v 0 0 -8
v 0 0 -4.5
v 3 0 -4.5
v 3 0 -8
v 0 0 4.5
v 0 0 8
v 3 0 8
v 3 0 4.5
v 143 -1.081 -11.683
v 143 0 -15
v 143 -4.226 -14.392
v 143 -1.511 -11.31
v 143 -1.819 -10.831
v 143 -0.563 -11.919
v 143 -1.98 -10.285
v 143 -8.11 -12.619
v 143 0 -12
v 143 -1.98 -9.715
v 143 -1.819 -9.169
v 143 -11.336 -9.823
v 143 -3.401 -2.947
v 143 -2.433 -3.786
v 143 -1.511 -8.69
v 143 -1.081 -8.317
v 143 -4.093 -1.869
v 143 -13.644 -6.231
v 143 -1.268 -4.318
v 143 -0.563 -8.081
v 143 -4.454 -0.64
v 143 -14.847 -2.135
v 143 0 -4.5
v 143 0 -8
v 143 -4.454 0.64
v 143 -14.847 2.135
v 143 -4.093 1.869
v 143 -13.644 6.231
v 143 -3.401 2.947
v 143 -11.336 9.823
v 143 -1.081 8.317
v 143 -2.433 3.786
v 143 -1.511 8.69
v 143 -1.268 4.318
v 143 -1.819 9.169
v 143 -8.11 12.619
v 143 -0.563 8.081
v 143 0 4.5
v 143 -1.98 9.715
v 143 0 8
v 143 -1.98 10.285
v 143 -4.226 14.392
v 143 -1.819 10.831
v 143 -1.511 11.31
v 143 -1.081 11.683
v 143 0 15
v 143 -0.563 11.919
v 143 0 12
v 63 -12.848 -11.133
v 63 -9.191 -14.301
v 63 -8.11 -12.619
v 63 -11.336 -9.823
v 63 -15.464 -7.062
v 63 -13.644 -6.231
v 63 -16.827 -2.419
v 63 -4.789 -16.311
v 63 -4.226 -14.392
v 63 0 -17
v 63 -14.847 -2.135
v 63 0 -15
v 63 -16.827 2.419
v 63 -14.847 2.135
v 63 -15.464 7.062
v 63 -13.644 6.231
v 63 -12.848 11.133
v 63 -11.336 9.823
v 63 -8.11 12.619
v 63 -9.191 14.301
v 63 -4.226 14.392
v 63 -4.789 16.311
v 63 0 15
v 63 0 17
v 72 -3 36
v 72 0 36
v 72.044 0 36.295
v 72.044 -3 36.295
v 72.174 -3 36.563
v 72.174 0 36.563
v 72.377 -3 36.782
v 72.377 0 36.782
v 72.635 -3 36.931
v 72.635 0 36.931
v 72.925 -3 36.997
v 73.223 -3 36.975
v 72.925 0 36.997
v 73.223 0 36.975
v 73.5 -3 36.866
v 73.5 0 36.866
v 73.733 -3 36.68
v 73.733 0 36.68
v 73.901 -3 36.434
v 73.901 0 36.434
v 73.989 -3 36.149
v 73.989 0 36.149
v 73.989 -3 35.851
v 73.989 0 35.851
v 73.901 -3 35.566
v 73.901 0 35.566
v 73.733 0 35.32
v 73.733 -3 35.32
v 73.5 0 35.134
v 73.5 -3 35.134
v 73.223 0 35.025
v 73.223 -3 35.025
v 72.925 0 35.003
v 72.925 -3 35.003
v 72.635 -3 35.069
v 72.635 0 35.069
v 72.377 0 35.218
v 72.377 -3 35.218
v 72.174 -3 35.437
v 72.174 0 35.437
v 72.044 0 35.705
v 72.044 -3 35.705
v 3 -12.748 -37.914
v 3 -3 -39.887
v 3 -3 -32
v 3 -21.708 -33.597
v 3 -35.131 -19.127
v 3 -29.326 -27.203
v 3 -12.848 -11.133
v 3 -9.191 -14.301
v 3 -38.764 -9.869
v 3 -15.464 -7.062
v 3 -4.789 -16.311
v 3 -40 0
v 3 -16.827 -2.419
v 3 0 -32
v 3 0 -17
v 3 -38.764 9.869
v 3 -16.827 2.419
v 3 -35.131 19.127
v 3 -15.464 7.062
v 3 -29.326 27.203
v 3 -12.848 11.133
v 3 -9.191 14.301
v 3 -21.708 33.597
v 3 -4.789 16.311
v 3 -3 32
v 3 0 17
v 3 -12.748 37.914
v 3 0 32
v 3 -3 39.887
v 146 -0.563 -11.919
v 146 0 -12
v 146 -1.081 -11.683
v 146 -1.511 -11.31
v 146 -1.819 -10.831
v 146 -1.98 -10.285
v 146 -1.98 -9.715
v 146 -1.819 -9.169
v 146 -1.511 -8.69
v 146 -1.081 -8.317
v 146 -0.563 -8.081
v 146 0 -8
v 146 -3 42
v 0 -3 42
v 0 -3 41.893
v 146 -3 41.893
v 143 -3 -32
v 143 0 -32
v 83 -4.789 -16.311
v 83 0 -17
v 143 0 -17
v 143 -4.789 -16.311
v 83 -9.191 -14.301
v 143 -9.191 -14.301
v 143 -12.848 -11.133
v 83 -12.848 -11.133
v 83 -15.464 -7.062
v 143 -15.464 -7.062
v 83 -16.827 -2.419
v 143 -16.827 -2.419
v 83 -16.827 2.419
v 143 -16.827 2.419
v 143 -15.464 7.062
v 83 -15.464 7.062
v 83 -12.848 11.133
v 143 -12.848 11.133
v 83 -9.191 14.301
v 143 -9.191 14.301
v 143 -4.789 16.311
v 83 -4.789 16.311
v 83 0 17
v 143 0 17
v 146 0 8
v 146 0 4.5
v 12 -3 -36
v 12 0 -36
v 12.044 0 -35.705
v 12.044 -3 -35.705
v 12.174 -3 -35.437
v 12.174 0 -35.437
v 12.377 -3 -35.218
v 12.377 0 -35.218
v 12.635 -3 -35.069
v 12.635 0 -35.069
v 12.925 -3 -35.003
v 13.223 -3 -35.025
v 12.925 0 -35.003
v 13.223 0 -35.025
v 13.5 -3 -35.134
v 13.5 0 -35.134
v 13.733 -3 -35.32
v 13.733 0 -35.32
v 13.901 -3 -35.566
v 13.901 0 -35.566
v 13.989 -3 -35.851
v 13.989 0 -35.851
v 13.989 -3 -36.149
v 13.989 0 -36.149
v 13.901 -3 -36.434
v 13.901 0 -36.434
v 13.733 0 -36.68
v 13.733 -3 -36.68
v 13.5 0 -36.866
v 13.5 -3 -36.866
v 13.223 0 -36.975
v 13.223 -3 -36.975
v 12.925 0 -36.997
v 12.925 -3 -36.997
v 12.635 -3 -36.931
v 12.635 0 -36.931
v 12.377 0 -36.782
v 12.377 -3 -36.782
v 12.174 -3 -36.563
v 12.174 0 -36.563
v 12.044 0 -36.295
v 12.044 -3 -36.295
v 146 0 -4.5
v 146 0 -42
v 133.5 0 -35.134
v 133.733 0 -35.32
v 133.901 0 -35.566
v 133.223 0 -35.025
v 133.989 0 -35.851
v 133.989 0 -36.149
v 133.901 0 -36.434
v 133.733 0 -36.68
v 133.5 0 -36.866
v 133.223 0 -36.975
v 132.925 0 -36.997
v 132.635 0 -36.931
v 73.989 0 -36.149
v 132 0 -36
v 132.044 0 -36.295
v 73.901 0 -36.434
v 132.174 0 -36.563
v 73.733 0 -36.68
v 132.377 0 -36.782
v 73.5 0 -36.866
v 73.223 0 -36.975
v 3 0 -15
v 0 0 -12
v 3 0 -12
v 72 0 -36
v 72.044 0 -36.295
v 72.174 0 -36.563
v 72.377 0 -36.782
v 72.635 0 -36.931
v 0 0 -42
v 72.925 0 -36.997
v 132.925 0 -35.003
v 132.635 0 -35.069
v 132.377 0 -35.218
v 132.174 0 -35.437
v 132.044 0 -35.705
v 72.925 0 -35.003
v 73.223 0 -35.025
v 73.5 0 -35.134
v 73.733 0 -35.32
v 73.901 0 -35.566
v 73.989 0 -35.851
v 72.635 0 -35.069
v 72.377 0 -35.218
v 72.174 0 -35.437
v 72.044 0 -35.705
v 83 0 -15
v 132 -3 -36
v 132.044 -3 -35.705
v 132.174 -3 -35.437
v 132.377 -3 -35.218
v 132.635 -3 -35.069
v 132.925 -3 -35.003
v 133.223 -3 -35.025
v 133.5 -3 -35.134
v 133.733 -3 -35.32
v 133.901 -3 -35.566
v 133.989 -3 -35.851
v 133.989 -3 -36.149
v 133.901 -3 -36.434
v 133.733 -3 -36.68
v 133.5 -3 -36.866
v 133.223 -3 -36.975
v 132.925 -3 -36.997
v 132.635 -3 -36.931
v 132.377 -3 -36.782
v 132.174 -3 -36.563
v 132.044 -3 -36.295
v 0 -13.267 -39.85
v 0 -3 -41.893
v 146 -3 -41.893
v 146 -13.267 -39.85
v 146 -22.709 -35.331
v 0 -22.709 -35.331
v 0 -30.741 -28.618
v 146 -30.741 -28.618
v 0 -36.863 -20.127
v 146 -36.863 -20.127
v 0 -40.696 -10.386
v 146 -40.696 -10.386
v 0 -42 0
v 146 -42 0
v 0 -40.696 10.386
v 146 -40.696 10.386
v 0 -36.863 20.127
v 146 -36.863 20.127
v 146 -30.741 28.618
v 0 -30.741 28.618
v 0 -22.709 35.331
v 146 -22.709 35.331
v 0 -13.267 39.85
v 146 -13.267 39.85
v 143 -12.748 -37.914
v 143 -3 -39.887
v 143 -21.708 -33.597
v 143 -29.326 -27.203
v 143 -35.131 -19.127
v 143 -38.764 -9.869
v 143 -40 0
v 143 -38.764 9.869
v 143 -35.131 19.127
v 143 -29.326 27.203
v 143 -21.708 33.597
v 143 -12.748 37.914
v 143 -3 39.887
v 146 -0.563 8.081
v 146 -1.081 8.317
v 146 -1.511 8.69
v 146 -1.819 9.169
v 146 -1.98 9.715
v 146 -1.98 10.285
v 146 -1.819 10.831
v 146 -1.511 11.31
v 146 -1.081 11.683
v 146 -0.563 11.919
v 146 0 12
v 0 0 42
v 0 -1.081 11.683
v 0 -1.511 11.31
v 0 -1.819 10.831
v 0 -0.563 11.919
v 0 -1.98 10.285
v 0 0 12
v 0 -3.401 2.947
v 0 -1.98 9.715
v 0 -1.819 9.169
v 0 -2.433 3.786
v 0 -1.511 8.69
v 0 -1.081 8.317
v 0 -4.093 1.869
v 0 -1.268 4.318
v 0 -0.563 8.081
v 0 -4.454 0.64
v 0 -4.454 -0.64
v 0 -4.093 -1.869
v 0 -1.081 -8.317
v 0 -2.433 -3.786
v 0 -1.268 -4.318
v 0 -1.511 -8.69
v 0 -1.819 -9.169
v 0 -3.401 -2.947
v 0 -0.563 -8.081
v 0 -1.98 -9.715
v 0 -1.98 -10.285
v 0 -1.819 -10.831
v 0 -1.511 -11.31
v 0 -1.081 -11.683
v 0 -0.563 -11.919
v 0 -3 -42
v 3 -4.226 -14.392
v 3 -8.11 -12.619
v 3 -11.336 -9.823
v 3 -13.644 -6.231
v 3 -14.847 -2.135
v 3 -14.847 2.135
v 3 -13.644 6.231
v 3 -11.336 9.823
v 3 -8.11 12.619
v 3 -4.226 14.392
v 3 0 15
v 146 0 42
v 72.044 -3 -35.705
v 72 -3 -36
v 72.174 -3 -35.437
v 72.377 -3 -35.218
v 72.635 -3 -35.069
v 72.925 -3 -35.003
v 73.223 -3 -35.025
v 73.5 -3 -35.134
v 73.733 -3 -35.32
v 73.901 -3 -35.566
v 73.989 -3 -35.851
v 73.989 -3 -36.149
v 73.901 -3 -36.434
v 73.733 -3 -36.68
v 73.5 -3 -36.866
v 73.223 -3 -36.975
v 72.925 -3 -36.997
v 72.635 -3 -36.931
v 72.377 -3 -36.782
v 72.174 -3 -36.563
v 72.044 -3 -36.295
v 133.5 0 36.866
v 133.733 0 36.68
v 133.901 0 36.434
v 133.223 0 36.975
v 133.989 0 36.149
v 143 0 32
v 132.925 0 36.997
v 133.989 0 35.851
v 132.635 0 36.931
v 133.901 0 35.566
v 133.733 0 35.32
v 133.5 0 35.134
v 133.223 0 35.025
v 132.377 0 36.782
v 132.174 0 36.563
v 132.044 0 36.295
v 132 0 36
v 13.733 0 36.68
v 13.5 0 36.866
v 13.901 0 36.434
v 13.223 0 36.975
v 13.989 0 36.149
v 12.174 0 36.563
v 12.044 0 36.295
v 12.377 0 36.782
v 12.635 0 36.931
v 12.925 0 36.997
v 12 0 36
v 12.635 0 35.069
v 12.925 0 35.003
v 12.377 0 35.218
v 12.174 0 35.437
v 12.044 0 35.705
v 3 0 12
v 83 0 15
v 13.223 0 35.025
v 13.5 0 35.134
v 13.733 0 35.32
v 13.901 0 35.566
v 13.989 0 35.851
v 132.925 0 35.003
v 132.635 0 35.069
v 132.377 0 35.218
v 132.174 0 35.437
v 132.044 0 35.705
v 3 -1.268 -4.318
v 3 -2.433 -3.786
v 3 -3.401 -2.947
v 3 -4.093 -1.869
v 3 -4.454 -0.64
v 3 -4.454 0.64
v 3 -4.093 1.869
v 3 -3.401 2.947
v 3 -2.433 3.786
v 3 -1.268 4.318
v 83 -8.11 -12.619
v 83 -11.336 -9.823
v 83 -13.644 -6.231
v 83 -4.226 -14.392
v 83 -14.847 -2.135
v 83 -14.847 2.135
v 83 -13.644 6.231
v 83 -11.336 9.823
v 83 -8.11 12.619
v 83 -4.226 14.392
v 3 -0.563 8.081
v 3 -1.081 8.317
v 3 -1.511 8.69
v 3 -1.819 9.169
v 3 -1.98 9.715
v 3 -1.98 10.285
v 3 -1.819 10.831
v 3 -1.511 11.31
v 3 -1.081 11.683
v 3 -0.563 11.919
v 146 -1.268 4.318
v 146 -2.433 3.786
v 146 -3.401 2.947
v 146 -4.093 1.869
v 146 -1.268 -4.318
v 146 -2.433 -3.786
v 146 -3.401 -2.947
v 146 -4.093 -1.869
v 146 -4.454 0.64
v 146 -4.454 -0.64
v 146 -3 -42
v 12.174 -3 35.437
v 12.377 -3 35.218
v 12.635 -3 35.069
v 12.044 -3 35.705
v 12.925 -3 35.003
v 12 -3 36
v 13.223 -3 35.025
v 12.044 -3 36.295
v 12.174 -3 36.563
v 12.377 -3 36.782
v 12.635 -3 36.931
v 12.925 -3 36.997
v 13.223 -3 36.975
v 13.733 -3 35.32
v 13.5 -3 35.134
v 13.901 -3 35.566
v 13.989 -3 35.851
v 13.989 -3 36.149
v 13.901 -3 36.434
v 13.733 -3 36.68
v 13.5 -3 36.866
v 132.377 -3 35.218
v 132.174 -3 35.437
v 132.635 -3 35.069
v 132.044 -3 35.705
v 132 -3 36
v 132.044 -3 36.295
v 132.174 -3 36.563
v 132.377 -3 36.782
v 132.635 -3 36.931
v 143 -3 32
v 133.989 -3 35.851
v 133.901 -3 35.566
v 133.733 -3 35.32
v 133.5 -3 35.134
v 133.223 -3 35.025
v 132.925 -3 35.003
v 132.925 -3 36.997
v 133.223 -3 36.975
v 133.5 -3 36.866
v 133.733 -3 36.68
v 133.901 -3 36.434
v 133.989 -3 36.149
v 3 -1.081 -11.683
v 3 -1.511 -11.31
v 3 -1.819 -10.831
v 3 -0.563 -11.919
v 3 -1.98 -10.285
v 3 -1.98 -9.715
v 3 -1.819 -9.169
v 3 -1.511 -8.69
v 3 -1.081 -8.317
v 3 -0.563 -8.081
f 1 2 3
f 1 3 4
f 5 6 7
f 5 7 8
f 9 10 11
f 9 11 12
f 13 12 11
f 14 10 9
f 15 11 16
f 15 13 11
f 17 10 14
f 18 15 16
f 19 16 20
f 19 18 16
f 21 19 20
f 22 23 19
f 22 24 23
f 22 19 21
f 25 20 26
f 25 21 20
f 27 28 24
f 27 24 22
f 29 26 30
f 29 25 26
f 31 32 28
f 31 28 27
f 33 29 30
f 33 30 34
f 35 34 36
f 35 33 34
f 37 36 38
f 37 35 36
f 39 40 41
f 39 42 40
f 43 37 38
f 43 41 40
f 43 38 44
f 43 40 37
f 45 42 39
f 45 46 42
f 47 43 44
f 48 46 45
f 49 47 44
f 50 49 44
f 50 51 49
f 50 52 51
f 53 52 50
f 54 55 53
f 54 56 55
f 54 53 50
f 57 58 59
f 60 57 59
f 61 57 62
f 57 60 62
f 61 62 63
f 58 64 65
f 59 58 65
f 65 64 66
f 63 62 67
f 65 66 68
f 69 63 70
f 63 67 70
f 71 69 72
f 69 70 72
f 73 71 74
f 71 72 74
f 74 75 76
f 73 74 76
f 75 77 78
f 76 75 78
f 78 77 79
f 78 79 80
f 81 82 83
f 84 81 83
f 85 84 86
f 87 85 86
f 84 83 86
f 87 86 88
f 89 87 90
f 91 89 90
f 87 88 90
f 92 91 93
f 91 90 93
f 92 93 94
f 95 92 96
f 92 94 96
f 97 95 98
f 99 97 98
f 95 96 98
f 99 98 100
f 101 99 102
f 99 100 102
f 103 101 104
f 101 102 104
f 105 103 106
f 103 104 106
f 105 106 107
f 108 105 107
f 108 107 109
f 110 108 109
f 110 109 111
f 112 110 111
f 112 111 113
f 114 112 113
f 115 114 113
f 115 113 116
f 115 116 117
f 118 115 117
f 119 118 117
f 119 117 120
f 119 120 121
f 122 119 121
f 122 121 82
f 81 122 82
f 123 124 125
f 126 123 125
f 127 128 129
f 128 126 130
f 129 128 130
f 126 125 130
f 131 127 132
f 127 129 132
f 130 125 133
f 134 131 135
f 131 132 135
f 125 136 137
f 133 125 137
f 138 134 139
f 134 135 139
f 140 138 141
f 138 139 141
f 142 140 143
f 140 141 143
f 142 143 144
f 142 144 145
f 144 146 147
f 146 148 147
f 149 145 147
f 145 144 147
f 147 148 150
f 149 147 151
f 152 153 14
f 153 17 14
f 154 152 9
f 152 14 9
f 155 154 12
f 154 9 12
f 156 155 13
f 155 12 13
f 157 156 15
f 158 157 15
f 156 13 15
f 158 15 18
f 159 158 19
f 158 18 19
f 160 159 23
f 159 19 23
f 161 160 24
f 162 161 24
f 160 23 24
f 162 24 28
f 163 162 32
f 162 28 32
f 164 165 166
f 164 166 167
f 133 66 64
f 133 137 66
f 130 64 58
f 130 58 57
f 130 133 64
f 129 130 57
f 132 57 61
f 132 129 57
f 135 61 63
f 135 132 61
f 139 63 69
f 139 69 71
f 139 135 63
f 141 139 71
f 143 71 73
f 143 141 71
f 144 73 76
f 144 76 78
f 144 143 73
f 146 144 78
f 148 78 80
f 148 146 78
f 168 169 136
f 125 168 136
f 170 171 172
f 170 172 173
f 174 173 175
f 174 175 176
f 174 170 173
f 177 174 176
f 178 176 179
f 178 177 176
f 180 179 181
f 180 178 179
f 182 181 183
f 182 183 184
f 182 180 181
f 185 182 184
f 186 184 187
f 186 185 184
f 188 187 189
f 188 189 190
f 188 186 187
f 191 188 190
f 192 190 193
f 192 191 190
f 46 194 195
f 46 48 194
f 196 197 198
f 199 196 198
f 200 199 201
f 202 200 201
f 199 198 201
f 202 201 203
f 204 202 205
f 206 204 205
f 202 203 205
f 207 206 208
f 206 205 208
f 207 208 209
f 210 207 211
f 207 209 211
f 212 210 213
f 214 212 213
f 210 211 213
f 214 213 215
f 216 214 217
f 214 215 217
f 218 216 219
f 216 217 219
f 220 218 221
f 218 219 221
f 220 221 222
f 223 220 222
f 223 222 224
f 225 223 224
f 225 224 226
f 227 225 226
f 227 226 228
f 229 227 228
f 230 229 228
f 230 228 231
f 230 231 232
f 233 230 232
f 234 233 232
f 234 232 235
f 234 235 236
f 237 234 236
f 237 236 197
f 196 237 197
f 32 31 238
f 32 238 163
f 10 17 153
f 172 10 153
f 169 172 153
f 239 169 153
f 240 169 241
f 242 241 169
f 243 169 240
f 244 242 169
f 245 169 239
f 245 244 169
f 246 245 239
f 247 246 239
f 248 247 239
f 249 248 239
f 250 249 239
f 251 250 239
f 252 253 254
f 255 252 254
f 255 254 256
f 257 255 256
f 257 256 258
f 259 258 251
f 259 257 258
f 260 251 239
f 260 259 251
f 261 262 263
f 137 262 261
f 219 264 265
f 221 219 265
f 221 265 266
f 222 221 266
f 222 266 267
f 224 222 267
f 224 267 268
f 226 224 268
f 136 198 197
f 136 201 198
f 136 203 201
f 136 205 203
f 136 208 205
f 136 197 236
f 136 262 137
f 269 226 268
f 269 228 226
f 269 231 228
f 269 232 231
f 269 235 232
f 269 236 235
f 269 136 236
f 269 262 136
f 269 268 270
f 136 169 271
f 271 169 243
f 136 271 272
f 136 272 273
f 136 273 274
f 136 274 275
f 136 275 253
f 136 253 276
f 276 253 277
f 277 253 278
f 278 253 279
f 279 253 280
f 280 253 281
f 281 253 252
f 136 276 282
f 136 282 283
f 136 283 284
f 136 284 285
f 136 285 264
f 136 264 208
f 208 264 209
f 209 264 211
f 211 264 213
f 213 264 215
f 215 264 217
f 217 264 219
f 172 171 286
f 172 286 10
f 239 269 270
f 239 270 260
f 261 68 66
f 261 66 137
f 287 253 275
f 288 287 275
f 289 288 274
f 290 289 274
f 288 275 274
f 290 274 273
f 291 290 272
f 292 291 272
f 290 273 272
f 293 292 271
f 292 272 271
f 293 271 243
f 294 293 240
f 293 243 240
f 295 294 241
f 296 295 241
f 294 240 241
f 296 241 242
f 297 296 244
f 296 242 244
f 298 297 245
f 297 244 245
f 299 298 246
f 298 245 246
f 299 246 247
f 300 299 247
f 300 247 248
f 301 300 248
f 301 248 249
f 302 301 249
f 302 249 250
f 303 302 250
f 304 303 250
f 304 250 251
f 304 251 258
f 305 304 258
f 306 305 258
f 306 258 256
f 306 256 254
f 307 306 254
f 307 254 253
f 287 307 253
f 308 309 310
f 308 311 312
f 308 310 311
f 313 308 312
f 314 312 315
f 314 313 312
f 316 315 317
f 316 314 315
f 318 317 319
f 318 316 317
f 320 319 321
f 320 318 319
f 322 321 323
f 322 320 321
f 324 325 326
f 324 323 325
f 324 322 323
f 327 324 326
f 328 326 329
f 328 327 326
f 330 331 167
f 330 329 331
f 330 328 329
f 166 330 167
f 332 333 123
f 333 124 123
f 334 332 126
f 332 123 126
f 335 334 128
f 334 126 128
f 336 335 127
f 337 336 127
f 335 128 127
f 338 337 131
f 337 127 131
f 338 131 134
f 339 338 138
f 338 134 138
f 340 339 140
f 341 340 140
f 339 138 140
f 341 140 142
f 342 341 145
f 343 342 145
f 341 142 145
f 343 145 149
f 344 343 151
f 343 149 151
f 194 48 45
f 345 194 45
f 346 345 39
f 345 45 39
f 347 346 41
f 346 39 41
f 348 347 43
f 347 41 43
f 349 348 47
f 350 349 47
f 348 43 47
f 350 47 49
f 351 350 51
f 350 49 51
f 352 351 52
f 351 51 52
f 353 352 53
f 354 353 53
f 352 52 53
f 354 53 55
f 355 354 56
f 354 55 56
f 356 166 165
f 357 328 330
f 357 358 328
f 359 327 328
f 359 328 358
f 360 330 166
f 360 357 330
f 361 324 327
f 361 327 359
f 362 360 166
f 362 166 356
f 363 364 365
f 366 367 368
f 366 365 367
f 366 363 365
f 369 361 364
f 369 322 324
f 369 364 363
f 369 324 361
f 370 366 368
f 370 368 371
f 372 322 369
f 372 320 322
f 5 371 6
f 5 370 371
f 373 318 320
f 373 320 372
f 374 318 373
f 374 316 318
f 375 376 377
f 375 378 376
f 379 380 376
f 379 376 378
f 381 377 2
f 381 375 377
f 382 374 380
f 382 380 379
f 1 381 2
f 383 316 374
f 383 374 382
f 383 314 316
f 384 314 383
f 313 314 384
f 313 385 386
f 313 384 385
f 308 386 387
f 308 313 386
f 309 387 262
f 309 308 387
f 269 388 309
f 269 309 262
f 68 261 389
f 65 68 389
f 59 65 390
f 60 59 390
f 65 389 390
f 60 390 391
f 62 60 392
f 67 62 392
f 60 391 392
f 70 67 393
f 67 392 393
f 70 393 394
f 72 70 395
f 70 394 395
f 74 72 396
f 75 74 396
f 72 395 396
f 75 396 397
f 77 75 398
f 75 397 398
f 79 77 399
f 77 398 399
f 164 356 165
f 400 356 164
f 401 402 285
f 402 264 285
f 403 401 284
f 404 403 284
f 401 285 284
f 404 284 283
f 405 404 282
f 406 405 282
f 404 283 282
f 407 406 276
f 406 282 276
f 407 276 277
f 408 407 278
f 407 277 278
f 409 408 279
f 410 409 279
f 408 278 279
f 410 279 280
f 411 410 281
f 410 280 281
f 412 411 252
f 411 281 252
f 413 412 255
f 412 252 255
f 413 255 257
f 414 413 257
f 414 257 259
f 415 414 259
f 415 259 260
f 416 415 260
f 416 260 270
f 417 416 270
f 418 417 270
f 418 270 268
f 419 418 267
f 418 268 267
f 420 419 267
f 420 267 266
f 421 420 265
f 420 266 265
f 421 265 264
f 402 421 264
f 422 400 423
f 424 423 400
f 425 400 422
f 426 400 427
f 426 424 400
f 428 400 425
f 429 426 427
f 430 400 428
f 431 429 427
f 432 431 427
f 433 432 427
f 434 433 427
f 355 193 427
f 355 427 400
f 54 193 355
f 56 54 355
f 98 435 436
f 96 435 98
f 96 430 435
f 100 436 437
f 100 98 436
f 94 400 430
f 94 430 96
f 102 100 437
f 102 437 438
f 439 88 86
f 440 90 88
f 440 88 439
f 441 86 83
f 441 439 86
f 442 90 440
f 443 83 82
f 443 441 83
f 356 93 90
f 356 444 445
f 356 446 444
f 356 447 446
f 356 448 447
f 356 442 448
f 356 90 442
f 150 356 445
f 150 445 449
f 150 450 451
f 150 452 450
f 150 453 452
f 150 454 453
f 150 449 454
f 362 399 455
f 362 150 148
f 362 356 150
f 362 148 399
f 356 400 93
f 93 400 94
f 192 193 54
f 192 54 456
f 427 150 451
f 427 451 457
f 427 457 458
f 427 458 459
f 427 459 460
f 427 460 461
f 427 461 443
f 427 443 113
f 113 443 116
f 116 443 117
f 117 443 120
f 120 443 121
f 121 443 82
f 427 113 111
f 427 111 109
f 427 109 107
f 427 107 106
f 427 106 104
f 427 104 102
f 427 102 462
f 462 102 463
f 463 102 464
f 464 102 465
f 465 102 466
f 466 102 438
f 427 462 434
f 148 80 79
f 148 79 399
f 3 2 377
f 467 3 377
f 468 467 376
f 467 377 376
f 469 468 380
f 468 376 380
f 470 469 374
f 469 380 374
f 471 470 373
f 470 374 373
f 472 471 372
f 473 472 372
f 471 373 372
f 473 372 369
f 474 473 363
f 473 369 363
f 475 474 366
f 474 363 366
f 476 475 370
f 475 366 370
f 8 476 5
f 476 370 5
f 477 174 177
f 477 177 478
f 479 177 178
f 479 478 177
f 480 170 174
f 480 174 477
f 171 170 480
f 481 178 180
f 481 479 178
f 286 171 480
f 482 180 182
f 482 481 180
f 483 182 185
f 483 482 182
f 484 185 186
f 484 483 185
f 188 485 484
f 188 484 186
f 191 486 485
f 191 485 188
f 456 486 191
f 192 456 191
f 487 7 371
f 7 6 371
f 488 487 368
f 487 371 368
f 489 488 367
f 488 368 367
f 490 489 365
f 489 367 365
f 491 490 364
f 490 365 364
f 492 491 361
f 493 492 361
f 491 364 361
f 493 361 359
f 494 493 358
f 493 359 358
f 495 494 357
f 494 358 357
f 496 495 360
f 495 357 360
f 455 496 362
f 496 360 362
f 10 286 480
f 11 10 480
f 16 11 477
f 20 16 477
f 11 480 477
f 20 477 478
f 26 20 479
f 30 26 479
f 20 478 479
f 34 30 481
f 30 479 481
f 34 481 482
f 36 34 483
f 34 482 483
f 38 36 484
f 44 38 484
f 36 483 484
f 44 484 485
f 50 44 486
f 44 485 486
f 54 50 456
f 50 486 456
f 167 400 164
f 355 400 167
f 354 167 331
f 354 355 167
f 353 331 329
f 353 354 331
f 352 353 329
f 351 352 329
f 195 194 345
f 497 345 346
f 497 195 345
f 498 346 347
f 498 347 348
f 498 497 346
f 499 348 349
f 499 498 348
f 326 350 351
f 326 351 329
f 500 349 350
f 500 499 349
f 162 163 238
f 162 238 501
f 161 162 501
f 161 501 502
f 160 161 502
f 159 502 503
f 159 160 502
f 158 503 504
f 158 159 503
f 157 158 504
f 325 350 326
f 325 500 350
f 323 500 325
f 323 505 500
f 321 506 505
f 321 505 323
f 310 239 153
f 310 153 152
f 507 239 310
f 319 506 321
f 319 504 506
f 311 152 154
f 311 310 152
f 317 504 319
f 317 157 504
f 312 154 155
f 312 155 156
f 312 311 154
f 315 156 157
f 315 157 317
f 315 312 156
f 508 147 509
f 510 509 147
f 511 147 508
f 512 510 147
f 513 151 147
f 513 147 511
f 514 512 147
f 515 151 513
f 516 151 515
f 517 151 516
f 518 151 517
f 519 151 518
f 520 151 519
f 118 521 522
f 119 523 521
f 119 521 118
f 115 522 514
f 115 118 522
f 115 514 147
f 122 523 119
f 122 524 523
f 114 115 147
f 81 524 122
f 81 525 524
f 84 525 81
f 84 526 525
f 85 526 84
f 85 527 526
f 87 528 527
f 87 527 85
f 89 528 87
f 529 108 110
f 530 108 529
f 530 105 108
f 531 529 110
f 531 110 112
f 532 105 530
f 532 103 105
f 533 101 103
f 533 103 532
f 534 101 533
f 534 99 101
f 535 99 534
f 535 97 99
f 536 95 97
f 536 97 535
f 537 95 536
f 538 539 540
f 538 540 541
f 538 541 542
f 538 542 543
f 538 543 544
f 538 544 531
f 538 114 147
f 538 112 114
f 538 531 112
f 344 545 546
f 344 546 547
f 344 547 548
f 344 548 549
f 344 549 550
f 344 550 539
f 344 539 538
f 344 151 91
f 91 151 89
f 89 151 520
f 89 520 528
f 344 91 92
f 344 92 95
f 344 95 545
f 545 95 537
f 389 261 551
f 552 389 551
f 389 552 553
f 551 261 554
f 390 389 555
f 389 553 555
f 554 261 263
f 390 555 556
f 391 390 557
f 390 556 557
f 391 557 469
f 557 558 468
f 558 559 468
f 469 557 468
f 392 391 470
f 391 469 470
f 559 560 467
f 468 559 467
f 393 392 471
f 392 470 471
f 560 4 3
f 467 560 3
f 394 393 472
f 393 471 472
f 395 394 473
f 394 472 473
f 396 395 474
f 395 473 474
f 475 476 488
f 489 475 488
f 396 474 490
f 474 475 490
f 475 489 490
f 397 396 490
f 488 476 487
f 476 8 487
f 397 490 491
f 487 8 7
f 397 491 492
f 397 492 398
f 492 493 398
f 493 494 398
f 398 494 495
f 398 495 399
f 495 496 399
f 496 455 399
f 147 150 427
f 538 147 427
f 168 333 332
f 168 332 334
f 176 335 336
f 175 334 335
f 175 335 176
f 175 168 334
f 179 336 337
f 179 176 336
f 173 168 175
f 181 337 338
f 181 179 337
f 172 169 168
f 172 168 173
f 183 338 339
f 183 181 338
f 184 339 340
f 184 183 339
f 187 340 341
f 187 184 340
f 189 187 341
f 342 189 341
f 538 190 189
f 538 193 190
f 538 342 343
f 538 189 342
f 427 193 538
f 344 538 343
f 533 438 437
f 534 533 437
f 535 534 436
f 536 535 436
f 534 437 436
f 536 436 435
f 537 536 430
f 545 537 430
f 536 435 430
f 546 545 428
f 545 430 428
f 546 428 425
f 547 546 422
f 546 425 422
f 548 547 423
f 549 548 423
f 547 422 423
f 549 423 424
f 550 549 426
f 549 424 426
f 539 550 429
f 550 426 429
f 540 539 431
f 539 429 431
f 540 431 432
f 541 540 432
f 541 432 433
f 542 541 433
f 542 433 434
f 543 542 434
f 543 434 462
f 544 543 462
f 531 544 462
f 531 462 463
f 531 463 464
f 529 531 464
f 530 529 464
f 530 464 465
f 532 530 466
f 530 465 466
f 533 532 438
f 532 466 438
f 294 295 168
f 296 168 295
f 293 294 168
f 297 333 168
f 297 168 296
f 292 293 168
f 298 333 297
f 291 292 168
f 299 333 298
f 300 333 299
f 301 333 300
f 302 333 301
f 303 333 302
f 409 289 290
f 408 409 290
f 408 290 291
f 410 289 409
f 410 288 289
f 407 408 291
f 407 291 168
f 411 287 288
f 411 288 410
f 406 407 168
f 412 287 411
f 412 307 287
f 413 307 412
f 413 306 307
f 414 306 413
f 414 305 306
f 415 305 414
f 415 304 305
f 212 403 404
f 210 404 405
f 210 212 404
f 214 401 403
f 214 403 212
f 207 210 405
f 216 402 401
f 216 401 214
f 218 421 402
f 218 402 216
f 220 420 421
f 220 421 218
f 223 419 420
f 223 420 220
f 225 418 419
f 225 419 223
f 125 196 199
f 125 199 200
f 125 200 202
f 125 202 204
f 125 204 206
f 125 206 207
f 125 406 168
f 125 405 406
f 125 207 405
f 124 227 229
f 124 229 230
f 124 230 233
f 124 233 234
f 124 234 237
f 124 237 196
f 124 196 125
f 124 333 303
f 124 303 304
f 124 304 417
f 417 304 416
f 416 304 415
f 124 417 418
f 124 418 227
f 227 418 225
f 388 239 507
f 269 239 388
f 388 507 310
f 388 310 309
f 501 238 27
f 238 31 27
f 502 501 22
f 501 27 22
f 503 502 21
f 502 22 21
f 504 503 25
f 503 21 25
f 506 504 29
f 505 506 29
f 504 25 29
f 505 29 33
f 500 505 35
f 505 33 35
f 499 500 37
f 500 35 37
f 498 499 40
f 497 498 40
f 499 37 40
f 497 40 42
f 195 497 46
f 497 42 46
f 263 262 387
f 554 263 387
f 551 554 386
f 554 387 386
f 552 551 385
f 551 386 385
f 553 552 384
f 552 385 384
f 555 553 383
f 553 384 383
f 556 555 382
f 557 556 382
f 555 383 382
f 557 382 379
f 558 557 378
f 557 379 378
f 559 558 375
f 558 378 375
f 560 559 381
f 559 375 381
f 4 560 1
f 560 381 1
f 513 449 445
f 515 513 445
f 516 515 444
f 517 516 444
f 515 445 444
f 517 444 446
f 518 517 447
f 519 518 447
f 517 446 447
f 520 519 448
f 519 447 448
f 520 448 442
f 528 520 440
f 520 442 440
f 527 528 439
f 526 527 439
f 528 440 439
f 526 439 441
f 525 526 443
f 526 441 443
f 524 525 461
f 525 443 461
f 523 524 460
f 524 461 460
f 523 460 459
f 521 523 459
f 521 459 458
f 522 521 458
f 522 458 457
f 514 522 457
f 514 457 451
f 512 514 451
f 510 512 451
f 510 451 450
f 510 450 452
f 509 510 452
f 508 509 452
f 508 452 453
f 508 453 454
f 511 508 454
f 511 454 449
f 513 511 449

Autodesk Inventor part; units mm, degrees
ref_plane "YZ Plane" through (0, 0, 0) normal (1, 0, 0) x (0, 1, 0)
ref_plane "XZ Plane" through (0, 0, 0) normal (0, 1, 0) x (-1, 0, 0)
ref_plane "XY Plane" through (0, 0, 0) normal (0, 0, 1) x (1, 0, 0)
sketch "Szkic1" plane through (0, 0, 0) normal (1, 0, 0) x (0, 1, 0)
  circle A0 centre (0, 0) radius 42
  dimension "d0" = 84
extrude "Wyciągnięcie proste1" add sketch "Szkic1" along normal blind 146
ref_plane "Płaszczyzna konstrukcyjna1" through (3, 0, 0) normal (-1, 0, 0) x (0, 0, 1)
sketch "Szkic2" plane through (3, 0, 0) normal (-1, 0, 0) x (0, 0, 1)
  point P0 (0, 0)
sketch "Szkic3" plane through (3, 0, 0) normal (-1, 0, 0) x (0, 0, 1)
  circle A0 centre (0, 0) radius 17
  circle A1 centre (0, 0) radius 15
  arc A2 (-17.4356, 36) -> (17.4356, 36) centre (0, 0) ccw
  line L0 (17.4356, 36) -> (-17.4356, 36)
  dimension "d4" = 34
  dimension "d5" = 30
  dimension "d10" = 80
sketch "Szkic4" plane through (0, 0, 0) normal (-1, 0, 0) x (0, 0, 1)
  circle A0 centre (0, 0) radius 42 projected
  circle A1 centre (0, 0) radius 4.5
  circle A2 centre (10, 0) radius 2
  circle A3 centre (-10, 0) radius 2
  dimension "d6" = 9
extrude "Wyciągnięcie proste2" cut sketch "Szkic4" against normal blind 146 contours A1 | A2 | A3
extrude "Wyciągnięcie proste3" cut sketch "Szkic3" against normal blind 140
ref_plane "Płaszczyzna konstrukcyjna2" through (63, 0, 0) normal (-1, 0, 0) x (0, 0, 1)
sketch "Szkic6" plane through (63, 0, 0) normal (-1, 0, 0) x (0, 0, 1)
  circle A0 centre (0, 0) radius 17
extrude "Wyciągnięcie proste4" cut sketch "Szkic6" against normal blind 20
sketch "Szkic7" plane through (0, 0, 0) normal (-1, 0, 0) x (0, 0, 1)
  circle A0 centre (-10, 0) radius 2 projected
  circle A1 centre (10, 0) radius 2 projected
  circle A2 centre (0, 0) radius 4.5 projected
  circle A3 centre (0, 0) radius 42 projected
  point P0 (42, 0)
ref_plane "Płaszczyzna konstrukcyjna3" through (0, 0, 42) normal (0, 0, 1) x (1, 0, 0)
sketch "Szkic8" plane through (0, 0, 42) normal (0, 0, 1) x (1, 0, 0)
  line L0 (0, -4.5) -> (0, 4.5) projected
  line L1 (146, 3) -> (0, 3)
  line L2 (0, 3) -> (0, -3)
  line L3 (0, -3) -> (146, -3)
  line L4 (146, -3) -> (146, 3)
  line L5 (146, 3) -> (0, -3) construction
  line L6 (0, 3) -> (146, -3) construction
  point P0 (0, 0)
  point P1 (73, 0)
  dimension "d16" = 6
extrude "Wyciągnięcie proste5" add sketch "Szkic8" against normal blind 10
sketch "Szkic9" plane through (0, 0, 0) normal (-1, 0, 0) x (0, 0, 1)
  line L0 (42, 3) -> (42, -3) projected
  line L1 (42, 3) -> (41.8927, 3) projected
  arc A0 (41.8927, 3) -> (41.8927, -3) centre (0, 0) ccw projected
  line L2 (42, -3) -> (41.8927, -3) projected
  circle A1 centre (0, 0) radius 4.5 projected
  circle A2 centre (10, 0) radius 2 projected
  circle A3 centre (-10, 0) radius 2 projected
  point P0 (-42, 0)
ref_plane "Płaszczyzna konstrukcyjna4" through (0, 0, -42) normal (0, 0, -1) x (-1, 0, 0)
sketch "Szkic10" plane through (0, 0, -42) normal (0, 0, -1) x (-1, 0, 0)
  line L0 (-146, -3) -> (0, -3)
  line L1 (0, -3) -> (0, 3)
  line L2 (0, 3) -> (-146, 3)
  line L3 (-146, 3) -> (-146, -3)
  line L4 (-146, -3) -> (0, 3) construction
  line L5 (0, -3) -> (-146, 3) construction
  point P0 (0, 0)
  point P1 (-73, 0)
extrude "Wyciągnięcie proste6" add sketch "Szkic10" against normal blind 10
sketch "Szkic11" plane through (0, 0, 0) normal (-1, 0, 0) x (0, 0, 1)
  circle A0 centre (-10, 0) radius 2 projected
  circle A1 centre (10, 0) radius 2 projected
  circle A2 centre (0, 0) radius 4.5 projected
  line L0 (-42, -3) -> (-42, 3) projected
  line L1 (-42, -3) -> (-41.8927, -3) projected
  arc A3 (-41.8927, -3) -> (41.8927, -3) centre (0, 0) ccw projected
  line L2 (42, -3) -> (41.8927, -3) projected
  line L3 (42, 3) -> (42, -3) projected
  line L4 (42, 3) -> (41.8927, 3) projected
  arc A4 (41.8927, 3) -> (-41.8927, 3) centre (0, 0) ccw projected
  line L5 (-42, 3) -> (-41.8927, 3) projected
  arc A5 (41.8927, 3) -> (-41.8927, 3) centre (0, 0) ccw projected
  point P0 (0, 42)
ref_plane "Płaszczyzna konstrukcyjna5" through (0, 42, 0) normal (0, 1, 0) x (-1, 0, 0)
sketch "Szkic12" plane through (0, 42, 0) normal (0, 1, 0) x (-1, 0, 0)
  circle A0 centre (-73, -36) radius 1
  circle A1 centre (-133, -36) radius 1
  circle A2 centre (-13, -36) radius 1
  circle A3 centre (-13, 36) radius 1
  circle A4 centre (-73, 36) radius 1
  circle A5 centre (-133, 36) radius 1
  point P0 (0, 0)
extrude "Wyciągnięcie proste7" cut sketch "Szkic12" against normal blind 45
ref_plane "Płaszczyzna konstrukcyjna7" through (0, 38, 0) normal (0, 1, 0) x (-1, 0, 0)
sketch "Szkic16" plane through (0, 42, 0) normal (0, 1, 0) x (-1, 0, 0)
  line L0 (-110, -6) -> (-36, -6)
  line L1 (-36, -6) -> (-36, 1)
  line L2 (-42, 6) -> (-104, 6)
  line L3 (-110, 1) -> (-110, -6)
  line L4 (-110, -6) -> (-36, 6) construction
  line L5 (-36, -6) -> (-110, 6) construction
  line L6 (-2, -15) -> (-144, -15)
  line L7 (-144, -15) -> (-144, 15)
  line L8 (-144, 15) -> (-2, 15)
  line L9 (-2, 15) -> (-2, -15)
  line L10 (-2, -15) -> (-144, 15) construction
  line L11 (-144, -15) -> (-2, 15) construction
  line L12 (-110, 1) -> (-104, 1)
  line L13 (-104, 1) -> (-104, 6)
  line L14 (-36, 1) -> (-42, 1)
  line L15 (-42, 1) -> (-42, 6)
  point P0 (0, 0)
  point P1 (-73, 0)
  dimension "d36" = 74
  dimension "d37" = 12
extrude "Wyciągnięcie proste11" cut sketch "Szkic16" against normal blind 4.25 contours L3 L12 L13 L2 L15 L14 L1 L0
sketch "Szkic17" plane through (0, 38, 0) normal (0, 1, 0) x (-1, 0, 0)
  line L0 (-110.5, -6.5) -> (-35.5, -6.5)
  line L1 (-35.5, -6.5) -> (-35.5, 6.5)
  line L2 (-35.5, 6.5) -> (-110.5, 6.5)
  line L3 (-110.5, 6.5) -> (-110.5, -6.5)
  line L4 (-110.5, -6.5) -> (-35.5, 6.5) construction
  line L5 (-35.5, -6.5) -> (-110.5, 6.5) construction
  point P0 (0, 0)
  point P1 (-73, 0)
  dimension "d40" = 75
  dimension "d41" = 13
extrude "Wyciągnięcie proste12" cut sketch "Szkic17" along normal blind 0.5
sketch "Szkic18" plane through (0, 0, 0) normal (-1, 0, 0) x (0, 0, 1)
  line L0 (42, 3) -> (42, -3) projected
  line L1 (42, 0) -> (-42, 0)
  line L2 (-42, 0) -> (-42, 42)
  line L3 (-42, 42) -> (42, 42)
  line L4 (42, 42) -> (42, 0)
extrude "Wyciągnięcie proste13" cut sketch "Szkic18" against normal blind 146
properties part number "v1.0L"
